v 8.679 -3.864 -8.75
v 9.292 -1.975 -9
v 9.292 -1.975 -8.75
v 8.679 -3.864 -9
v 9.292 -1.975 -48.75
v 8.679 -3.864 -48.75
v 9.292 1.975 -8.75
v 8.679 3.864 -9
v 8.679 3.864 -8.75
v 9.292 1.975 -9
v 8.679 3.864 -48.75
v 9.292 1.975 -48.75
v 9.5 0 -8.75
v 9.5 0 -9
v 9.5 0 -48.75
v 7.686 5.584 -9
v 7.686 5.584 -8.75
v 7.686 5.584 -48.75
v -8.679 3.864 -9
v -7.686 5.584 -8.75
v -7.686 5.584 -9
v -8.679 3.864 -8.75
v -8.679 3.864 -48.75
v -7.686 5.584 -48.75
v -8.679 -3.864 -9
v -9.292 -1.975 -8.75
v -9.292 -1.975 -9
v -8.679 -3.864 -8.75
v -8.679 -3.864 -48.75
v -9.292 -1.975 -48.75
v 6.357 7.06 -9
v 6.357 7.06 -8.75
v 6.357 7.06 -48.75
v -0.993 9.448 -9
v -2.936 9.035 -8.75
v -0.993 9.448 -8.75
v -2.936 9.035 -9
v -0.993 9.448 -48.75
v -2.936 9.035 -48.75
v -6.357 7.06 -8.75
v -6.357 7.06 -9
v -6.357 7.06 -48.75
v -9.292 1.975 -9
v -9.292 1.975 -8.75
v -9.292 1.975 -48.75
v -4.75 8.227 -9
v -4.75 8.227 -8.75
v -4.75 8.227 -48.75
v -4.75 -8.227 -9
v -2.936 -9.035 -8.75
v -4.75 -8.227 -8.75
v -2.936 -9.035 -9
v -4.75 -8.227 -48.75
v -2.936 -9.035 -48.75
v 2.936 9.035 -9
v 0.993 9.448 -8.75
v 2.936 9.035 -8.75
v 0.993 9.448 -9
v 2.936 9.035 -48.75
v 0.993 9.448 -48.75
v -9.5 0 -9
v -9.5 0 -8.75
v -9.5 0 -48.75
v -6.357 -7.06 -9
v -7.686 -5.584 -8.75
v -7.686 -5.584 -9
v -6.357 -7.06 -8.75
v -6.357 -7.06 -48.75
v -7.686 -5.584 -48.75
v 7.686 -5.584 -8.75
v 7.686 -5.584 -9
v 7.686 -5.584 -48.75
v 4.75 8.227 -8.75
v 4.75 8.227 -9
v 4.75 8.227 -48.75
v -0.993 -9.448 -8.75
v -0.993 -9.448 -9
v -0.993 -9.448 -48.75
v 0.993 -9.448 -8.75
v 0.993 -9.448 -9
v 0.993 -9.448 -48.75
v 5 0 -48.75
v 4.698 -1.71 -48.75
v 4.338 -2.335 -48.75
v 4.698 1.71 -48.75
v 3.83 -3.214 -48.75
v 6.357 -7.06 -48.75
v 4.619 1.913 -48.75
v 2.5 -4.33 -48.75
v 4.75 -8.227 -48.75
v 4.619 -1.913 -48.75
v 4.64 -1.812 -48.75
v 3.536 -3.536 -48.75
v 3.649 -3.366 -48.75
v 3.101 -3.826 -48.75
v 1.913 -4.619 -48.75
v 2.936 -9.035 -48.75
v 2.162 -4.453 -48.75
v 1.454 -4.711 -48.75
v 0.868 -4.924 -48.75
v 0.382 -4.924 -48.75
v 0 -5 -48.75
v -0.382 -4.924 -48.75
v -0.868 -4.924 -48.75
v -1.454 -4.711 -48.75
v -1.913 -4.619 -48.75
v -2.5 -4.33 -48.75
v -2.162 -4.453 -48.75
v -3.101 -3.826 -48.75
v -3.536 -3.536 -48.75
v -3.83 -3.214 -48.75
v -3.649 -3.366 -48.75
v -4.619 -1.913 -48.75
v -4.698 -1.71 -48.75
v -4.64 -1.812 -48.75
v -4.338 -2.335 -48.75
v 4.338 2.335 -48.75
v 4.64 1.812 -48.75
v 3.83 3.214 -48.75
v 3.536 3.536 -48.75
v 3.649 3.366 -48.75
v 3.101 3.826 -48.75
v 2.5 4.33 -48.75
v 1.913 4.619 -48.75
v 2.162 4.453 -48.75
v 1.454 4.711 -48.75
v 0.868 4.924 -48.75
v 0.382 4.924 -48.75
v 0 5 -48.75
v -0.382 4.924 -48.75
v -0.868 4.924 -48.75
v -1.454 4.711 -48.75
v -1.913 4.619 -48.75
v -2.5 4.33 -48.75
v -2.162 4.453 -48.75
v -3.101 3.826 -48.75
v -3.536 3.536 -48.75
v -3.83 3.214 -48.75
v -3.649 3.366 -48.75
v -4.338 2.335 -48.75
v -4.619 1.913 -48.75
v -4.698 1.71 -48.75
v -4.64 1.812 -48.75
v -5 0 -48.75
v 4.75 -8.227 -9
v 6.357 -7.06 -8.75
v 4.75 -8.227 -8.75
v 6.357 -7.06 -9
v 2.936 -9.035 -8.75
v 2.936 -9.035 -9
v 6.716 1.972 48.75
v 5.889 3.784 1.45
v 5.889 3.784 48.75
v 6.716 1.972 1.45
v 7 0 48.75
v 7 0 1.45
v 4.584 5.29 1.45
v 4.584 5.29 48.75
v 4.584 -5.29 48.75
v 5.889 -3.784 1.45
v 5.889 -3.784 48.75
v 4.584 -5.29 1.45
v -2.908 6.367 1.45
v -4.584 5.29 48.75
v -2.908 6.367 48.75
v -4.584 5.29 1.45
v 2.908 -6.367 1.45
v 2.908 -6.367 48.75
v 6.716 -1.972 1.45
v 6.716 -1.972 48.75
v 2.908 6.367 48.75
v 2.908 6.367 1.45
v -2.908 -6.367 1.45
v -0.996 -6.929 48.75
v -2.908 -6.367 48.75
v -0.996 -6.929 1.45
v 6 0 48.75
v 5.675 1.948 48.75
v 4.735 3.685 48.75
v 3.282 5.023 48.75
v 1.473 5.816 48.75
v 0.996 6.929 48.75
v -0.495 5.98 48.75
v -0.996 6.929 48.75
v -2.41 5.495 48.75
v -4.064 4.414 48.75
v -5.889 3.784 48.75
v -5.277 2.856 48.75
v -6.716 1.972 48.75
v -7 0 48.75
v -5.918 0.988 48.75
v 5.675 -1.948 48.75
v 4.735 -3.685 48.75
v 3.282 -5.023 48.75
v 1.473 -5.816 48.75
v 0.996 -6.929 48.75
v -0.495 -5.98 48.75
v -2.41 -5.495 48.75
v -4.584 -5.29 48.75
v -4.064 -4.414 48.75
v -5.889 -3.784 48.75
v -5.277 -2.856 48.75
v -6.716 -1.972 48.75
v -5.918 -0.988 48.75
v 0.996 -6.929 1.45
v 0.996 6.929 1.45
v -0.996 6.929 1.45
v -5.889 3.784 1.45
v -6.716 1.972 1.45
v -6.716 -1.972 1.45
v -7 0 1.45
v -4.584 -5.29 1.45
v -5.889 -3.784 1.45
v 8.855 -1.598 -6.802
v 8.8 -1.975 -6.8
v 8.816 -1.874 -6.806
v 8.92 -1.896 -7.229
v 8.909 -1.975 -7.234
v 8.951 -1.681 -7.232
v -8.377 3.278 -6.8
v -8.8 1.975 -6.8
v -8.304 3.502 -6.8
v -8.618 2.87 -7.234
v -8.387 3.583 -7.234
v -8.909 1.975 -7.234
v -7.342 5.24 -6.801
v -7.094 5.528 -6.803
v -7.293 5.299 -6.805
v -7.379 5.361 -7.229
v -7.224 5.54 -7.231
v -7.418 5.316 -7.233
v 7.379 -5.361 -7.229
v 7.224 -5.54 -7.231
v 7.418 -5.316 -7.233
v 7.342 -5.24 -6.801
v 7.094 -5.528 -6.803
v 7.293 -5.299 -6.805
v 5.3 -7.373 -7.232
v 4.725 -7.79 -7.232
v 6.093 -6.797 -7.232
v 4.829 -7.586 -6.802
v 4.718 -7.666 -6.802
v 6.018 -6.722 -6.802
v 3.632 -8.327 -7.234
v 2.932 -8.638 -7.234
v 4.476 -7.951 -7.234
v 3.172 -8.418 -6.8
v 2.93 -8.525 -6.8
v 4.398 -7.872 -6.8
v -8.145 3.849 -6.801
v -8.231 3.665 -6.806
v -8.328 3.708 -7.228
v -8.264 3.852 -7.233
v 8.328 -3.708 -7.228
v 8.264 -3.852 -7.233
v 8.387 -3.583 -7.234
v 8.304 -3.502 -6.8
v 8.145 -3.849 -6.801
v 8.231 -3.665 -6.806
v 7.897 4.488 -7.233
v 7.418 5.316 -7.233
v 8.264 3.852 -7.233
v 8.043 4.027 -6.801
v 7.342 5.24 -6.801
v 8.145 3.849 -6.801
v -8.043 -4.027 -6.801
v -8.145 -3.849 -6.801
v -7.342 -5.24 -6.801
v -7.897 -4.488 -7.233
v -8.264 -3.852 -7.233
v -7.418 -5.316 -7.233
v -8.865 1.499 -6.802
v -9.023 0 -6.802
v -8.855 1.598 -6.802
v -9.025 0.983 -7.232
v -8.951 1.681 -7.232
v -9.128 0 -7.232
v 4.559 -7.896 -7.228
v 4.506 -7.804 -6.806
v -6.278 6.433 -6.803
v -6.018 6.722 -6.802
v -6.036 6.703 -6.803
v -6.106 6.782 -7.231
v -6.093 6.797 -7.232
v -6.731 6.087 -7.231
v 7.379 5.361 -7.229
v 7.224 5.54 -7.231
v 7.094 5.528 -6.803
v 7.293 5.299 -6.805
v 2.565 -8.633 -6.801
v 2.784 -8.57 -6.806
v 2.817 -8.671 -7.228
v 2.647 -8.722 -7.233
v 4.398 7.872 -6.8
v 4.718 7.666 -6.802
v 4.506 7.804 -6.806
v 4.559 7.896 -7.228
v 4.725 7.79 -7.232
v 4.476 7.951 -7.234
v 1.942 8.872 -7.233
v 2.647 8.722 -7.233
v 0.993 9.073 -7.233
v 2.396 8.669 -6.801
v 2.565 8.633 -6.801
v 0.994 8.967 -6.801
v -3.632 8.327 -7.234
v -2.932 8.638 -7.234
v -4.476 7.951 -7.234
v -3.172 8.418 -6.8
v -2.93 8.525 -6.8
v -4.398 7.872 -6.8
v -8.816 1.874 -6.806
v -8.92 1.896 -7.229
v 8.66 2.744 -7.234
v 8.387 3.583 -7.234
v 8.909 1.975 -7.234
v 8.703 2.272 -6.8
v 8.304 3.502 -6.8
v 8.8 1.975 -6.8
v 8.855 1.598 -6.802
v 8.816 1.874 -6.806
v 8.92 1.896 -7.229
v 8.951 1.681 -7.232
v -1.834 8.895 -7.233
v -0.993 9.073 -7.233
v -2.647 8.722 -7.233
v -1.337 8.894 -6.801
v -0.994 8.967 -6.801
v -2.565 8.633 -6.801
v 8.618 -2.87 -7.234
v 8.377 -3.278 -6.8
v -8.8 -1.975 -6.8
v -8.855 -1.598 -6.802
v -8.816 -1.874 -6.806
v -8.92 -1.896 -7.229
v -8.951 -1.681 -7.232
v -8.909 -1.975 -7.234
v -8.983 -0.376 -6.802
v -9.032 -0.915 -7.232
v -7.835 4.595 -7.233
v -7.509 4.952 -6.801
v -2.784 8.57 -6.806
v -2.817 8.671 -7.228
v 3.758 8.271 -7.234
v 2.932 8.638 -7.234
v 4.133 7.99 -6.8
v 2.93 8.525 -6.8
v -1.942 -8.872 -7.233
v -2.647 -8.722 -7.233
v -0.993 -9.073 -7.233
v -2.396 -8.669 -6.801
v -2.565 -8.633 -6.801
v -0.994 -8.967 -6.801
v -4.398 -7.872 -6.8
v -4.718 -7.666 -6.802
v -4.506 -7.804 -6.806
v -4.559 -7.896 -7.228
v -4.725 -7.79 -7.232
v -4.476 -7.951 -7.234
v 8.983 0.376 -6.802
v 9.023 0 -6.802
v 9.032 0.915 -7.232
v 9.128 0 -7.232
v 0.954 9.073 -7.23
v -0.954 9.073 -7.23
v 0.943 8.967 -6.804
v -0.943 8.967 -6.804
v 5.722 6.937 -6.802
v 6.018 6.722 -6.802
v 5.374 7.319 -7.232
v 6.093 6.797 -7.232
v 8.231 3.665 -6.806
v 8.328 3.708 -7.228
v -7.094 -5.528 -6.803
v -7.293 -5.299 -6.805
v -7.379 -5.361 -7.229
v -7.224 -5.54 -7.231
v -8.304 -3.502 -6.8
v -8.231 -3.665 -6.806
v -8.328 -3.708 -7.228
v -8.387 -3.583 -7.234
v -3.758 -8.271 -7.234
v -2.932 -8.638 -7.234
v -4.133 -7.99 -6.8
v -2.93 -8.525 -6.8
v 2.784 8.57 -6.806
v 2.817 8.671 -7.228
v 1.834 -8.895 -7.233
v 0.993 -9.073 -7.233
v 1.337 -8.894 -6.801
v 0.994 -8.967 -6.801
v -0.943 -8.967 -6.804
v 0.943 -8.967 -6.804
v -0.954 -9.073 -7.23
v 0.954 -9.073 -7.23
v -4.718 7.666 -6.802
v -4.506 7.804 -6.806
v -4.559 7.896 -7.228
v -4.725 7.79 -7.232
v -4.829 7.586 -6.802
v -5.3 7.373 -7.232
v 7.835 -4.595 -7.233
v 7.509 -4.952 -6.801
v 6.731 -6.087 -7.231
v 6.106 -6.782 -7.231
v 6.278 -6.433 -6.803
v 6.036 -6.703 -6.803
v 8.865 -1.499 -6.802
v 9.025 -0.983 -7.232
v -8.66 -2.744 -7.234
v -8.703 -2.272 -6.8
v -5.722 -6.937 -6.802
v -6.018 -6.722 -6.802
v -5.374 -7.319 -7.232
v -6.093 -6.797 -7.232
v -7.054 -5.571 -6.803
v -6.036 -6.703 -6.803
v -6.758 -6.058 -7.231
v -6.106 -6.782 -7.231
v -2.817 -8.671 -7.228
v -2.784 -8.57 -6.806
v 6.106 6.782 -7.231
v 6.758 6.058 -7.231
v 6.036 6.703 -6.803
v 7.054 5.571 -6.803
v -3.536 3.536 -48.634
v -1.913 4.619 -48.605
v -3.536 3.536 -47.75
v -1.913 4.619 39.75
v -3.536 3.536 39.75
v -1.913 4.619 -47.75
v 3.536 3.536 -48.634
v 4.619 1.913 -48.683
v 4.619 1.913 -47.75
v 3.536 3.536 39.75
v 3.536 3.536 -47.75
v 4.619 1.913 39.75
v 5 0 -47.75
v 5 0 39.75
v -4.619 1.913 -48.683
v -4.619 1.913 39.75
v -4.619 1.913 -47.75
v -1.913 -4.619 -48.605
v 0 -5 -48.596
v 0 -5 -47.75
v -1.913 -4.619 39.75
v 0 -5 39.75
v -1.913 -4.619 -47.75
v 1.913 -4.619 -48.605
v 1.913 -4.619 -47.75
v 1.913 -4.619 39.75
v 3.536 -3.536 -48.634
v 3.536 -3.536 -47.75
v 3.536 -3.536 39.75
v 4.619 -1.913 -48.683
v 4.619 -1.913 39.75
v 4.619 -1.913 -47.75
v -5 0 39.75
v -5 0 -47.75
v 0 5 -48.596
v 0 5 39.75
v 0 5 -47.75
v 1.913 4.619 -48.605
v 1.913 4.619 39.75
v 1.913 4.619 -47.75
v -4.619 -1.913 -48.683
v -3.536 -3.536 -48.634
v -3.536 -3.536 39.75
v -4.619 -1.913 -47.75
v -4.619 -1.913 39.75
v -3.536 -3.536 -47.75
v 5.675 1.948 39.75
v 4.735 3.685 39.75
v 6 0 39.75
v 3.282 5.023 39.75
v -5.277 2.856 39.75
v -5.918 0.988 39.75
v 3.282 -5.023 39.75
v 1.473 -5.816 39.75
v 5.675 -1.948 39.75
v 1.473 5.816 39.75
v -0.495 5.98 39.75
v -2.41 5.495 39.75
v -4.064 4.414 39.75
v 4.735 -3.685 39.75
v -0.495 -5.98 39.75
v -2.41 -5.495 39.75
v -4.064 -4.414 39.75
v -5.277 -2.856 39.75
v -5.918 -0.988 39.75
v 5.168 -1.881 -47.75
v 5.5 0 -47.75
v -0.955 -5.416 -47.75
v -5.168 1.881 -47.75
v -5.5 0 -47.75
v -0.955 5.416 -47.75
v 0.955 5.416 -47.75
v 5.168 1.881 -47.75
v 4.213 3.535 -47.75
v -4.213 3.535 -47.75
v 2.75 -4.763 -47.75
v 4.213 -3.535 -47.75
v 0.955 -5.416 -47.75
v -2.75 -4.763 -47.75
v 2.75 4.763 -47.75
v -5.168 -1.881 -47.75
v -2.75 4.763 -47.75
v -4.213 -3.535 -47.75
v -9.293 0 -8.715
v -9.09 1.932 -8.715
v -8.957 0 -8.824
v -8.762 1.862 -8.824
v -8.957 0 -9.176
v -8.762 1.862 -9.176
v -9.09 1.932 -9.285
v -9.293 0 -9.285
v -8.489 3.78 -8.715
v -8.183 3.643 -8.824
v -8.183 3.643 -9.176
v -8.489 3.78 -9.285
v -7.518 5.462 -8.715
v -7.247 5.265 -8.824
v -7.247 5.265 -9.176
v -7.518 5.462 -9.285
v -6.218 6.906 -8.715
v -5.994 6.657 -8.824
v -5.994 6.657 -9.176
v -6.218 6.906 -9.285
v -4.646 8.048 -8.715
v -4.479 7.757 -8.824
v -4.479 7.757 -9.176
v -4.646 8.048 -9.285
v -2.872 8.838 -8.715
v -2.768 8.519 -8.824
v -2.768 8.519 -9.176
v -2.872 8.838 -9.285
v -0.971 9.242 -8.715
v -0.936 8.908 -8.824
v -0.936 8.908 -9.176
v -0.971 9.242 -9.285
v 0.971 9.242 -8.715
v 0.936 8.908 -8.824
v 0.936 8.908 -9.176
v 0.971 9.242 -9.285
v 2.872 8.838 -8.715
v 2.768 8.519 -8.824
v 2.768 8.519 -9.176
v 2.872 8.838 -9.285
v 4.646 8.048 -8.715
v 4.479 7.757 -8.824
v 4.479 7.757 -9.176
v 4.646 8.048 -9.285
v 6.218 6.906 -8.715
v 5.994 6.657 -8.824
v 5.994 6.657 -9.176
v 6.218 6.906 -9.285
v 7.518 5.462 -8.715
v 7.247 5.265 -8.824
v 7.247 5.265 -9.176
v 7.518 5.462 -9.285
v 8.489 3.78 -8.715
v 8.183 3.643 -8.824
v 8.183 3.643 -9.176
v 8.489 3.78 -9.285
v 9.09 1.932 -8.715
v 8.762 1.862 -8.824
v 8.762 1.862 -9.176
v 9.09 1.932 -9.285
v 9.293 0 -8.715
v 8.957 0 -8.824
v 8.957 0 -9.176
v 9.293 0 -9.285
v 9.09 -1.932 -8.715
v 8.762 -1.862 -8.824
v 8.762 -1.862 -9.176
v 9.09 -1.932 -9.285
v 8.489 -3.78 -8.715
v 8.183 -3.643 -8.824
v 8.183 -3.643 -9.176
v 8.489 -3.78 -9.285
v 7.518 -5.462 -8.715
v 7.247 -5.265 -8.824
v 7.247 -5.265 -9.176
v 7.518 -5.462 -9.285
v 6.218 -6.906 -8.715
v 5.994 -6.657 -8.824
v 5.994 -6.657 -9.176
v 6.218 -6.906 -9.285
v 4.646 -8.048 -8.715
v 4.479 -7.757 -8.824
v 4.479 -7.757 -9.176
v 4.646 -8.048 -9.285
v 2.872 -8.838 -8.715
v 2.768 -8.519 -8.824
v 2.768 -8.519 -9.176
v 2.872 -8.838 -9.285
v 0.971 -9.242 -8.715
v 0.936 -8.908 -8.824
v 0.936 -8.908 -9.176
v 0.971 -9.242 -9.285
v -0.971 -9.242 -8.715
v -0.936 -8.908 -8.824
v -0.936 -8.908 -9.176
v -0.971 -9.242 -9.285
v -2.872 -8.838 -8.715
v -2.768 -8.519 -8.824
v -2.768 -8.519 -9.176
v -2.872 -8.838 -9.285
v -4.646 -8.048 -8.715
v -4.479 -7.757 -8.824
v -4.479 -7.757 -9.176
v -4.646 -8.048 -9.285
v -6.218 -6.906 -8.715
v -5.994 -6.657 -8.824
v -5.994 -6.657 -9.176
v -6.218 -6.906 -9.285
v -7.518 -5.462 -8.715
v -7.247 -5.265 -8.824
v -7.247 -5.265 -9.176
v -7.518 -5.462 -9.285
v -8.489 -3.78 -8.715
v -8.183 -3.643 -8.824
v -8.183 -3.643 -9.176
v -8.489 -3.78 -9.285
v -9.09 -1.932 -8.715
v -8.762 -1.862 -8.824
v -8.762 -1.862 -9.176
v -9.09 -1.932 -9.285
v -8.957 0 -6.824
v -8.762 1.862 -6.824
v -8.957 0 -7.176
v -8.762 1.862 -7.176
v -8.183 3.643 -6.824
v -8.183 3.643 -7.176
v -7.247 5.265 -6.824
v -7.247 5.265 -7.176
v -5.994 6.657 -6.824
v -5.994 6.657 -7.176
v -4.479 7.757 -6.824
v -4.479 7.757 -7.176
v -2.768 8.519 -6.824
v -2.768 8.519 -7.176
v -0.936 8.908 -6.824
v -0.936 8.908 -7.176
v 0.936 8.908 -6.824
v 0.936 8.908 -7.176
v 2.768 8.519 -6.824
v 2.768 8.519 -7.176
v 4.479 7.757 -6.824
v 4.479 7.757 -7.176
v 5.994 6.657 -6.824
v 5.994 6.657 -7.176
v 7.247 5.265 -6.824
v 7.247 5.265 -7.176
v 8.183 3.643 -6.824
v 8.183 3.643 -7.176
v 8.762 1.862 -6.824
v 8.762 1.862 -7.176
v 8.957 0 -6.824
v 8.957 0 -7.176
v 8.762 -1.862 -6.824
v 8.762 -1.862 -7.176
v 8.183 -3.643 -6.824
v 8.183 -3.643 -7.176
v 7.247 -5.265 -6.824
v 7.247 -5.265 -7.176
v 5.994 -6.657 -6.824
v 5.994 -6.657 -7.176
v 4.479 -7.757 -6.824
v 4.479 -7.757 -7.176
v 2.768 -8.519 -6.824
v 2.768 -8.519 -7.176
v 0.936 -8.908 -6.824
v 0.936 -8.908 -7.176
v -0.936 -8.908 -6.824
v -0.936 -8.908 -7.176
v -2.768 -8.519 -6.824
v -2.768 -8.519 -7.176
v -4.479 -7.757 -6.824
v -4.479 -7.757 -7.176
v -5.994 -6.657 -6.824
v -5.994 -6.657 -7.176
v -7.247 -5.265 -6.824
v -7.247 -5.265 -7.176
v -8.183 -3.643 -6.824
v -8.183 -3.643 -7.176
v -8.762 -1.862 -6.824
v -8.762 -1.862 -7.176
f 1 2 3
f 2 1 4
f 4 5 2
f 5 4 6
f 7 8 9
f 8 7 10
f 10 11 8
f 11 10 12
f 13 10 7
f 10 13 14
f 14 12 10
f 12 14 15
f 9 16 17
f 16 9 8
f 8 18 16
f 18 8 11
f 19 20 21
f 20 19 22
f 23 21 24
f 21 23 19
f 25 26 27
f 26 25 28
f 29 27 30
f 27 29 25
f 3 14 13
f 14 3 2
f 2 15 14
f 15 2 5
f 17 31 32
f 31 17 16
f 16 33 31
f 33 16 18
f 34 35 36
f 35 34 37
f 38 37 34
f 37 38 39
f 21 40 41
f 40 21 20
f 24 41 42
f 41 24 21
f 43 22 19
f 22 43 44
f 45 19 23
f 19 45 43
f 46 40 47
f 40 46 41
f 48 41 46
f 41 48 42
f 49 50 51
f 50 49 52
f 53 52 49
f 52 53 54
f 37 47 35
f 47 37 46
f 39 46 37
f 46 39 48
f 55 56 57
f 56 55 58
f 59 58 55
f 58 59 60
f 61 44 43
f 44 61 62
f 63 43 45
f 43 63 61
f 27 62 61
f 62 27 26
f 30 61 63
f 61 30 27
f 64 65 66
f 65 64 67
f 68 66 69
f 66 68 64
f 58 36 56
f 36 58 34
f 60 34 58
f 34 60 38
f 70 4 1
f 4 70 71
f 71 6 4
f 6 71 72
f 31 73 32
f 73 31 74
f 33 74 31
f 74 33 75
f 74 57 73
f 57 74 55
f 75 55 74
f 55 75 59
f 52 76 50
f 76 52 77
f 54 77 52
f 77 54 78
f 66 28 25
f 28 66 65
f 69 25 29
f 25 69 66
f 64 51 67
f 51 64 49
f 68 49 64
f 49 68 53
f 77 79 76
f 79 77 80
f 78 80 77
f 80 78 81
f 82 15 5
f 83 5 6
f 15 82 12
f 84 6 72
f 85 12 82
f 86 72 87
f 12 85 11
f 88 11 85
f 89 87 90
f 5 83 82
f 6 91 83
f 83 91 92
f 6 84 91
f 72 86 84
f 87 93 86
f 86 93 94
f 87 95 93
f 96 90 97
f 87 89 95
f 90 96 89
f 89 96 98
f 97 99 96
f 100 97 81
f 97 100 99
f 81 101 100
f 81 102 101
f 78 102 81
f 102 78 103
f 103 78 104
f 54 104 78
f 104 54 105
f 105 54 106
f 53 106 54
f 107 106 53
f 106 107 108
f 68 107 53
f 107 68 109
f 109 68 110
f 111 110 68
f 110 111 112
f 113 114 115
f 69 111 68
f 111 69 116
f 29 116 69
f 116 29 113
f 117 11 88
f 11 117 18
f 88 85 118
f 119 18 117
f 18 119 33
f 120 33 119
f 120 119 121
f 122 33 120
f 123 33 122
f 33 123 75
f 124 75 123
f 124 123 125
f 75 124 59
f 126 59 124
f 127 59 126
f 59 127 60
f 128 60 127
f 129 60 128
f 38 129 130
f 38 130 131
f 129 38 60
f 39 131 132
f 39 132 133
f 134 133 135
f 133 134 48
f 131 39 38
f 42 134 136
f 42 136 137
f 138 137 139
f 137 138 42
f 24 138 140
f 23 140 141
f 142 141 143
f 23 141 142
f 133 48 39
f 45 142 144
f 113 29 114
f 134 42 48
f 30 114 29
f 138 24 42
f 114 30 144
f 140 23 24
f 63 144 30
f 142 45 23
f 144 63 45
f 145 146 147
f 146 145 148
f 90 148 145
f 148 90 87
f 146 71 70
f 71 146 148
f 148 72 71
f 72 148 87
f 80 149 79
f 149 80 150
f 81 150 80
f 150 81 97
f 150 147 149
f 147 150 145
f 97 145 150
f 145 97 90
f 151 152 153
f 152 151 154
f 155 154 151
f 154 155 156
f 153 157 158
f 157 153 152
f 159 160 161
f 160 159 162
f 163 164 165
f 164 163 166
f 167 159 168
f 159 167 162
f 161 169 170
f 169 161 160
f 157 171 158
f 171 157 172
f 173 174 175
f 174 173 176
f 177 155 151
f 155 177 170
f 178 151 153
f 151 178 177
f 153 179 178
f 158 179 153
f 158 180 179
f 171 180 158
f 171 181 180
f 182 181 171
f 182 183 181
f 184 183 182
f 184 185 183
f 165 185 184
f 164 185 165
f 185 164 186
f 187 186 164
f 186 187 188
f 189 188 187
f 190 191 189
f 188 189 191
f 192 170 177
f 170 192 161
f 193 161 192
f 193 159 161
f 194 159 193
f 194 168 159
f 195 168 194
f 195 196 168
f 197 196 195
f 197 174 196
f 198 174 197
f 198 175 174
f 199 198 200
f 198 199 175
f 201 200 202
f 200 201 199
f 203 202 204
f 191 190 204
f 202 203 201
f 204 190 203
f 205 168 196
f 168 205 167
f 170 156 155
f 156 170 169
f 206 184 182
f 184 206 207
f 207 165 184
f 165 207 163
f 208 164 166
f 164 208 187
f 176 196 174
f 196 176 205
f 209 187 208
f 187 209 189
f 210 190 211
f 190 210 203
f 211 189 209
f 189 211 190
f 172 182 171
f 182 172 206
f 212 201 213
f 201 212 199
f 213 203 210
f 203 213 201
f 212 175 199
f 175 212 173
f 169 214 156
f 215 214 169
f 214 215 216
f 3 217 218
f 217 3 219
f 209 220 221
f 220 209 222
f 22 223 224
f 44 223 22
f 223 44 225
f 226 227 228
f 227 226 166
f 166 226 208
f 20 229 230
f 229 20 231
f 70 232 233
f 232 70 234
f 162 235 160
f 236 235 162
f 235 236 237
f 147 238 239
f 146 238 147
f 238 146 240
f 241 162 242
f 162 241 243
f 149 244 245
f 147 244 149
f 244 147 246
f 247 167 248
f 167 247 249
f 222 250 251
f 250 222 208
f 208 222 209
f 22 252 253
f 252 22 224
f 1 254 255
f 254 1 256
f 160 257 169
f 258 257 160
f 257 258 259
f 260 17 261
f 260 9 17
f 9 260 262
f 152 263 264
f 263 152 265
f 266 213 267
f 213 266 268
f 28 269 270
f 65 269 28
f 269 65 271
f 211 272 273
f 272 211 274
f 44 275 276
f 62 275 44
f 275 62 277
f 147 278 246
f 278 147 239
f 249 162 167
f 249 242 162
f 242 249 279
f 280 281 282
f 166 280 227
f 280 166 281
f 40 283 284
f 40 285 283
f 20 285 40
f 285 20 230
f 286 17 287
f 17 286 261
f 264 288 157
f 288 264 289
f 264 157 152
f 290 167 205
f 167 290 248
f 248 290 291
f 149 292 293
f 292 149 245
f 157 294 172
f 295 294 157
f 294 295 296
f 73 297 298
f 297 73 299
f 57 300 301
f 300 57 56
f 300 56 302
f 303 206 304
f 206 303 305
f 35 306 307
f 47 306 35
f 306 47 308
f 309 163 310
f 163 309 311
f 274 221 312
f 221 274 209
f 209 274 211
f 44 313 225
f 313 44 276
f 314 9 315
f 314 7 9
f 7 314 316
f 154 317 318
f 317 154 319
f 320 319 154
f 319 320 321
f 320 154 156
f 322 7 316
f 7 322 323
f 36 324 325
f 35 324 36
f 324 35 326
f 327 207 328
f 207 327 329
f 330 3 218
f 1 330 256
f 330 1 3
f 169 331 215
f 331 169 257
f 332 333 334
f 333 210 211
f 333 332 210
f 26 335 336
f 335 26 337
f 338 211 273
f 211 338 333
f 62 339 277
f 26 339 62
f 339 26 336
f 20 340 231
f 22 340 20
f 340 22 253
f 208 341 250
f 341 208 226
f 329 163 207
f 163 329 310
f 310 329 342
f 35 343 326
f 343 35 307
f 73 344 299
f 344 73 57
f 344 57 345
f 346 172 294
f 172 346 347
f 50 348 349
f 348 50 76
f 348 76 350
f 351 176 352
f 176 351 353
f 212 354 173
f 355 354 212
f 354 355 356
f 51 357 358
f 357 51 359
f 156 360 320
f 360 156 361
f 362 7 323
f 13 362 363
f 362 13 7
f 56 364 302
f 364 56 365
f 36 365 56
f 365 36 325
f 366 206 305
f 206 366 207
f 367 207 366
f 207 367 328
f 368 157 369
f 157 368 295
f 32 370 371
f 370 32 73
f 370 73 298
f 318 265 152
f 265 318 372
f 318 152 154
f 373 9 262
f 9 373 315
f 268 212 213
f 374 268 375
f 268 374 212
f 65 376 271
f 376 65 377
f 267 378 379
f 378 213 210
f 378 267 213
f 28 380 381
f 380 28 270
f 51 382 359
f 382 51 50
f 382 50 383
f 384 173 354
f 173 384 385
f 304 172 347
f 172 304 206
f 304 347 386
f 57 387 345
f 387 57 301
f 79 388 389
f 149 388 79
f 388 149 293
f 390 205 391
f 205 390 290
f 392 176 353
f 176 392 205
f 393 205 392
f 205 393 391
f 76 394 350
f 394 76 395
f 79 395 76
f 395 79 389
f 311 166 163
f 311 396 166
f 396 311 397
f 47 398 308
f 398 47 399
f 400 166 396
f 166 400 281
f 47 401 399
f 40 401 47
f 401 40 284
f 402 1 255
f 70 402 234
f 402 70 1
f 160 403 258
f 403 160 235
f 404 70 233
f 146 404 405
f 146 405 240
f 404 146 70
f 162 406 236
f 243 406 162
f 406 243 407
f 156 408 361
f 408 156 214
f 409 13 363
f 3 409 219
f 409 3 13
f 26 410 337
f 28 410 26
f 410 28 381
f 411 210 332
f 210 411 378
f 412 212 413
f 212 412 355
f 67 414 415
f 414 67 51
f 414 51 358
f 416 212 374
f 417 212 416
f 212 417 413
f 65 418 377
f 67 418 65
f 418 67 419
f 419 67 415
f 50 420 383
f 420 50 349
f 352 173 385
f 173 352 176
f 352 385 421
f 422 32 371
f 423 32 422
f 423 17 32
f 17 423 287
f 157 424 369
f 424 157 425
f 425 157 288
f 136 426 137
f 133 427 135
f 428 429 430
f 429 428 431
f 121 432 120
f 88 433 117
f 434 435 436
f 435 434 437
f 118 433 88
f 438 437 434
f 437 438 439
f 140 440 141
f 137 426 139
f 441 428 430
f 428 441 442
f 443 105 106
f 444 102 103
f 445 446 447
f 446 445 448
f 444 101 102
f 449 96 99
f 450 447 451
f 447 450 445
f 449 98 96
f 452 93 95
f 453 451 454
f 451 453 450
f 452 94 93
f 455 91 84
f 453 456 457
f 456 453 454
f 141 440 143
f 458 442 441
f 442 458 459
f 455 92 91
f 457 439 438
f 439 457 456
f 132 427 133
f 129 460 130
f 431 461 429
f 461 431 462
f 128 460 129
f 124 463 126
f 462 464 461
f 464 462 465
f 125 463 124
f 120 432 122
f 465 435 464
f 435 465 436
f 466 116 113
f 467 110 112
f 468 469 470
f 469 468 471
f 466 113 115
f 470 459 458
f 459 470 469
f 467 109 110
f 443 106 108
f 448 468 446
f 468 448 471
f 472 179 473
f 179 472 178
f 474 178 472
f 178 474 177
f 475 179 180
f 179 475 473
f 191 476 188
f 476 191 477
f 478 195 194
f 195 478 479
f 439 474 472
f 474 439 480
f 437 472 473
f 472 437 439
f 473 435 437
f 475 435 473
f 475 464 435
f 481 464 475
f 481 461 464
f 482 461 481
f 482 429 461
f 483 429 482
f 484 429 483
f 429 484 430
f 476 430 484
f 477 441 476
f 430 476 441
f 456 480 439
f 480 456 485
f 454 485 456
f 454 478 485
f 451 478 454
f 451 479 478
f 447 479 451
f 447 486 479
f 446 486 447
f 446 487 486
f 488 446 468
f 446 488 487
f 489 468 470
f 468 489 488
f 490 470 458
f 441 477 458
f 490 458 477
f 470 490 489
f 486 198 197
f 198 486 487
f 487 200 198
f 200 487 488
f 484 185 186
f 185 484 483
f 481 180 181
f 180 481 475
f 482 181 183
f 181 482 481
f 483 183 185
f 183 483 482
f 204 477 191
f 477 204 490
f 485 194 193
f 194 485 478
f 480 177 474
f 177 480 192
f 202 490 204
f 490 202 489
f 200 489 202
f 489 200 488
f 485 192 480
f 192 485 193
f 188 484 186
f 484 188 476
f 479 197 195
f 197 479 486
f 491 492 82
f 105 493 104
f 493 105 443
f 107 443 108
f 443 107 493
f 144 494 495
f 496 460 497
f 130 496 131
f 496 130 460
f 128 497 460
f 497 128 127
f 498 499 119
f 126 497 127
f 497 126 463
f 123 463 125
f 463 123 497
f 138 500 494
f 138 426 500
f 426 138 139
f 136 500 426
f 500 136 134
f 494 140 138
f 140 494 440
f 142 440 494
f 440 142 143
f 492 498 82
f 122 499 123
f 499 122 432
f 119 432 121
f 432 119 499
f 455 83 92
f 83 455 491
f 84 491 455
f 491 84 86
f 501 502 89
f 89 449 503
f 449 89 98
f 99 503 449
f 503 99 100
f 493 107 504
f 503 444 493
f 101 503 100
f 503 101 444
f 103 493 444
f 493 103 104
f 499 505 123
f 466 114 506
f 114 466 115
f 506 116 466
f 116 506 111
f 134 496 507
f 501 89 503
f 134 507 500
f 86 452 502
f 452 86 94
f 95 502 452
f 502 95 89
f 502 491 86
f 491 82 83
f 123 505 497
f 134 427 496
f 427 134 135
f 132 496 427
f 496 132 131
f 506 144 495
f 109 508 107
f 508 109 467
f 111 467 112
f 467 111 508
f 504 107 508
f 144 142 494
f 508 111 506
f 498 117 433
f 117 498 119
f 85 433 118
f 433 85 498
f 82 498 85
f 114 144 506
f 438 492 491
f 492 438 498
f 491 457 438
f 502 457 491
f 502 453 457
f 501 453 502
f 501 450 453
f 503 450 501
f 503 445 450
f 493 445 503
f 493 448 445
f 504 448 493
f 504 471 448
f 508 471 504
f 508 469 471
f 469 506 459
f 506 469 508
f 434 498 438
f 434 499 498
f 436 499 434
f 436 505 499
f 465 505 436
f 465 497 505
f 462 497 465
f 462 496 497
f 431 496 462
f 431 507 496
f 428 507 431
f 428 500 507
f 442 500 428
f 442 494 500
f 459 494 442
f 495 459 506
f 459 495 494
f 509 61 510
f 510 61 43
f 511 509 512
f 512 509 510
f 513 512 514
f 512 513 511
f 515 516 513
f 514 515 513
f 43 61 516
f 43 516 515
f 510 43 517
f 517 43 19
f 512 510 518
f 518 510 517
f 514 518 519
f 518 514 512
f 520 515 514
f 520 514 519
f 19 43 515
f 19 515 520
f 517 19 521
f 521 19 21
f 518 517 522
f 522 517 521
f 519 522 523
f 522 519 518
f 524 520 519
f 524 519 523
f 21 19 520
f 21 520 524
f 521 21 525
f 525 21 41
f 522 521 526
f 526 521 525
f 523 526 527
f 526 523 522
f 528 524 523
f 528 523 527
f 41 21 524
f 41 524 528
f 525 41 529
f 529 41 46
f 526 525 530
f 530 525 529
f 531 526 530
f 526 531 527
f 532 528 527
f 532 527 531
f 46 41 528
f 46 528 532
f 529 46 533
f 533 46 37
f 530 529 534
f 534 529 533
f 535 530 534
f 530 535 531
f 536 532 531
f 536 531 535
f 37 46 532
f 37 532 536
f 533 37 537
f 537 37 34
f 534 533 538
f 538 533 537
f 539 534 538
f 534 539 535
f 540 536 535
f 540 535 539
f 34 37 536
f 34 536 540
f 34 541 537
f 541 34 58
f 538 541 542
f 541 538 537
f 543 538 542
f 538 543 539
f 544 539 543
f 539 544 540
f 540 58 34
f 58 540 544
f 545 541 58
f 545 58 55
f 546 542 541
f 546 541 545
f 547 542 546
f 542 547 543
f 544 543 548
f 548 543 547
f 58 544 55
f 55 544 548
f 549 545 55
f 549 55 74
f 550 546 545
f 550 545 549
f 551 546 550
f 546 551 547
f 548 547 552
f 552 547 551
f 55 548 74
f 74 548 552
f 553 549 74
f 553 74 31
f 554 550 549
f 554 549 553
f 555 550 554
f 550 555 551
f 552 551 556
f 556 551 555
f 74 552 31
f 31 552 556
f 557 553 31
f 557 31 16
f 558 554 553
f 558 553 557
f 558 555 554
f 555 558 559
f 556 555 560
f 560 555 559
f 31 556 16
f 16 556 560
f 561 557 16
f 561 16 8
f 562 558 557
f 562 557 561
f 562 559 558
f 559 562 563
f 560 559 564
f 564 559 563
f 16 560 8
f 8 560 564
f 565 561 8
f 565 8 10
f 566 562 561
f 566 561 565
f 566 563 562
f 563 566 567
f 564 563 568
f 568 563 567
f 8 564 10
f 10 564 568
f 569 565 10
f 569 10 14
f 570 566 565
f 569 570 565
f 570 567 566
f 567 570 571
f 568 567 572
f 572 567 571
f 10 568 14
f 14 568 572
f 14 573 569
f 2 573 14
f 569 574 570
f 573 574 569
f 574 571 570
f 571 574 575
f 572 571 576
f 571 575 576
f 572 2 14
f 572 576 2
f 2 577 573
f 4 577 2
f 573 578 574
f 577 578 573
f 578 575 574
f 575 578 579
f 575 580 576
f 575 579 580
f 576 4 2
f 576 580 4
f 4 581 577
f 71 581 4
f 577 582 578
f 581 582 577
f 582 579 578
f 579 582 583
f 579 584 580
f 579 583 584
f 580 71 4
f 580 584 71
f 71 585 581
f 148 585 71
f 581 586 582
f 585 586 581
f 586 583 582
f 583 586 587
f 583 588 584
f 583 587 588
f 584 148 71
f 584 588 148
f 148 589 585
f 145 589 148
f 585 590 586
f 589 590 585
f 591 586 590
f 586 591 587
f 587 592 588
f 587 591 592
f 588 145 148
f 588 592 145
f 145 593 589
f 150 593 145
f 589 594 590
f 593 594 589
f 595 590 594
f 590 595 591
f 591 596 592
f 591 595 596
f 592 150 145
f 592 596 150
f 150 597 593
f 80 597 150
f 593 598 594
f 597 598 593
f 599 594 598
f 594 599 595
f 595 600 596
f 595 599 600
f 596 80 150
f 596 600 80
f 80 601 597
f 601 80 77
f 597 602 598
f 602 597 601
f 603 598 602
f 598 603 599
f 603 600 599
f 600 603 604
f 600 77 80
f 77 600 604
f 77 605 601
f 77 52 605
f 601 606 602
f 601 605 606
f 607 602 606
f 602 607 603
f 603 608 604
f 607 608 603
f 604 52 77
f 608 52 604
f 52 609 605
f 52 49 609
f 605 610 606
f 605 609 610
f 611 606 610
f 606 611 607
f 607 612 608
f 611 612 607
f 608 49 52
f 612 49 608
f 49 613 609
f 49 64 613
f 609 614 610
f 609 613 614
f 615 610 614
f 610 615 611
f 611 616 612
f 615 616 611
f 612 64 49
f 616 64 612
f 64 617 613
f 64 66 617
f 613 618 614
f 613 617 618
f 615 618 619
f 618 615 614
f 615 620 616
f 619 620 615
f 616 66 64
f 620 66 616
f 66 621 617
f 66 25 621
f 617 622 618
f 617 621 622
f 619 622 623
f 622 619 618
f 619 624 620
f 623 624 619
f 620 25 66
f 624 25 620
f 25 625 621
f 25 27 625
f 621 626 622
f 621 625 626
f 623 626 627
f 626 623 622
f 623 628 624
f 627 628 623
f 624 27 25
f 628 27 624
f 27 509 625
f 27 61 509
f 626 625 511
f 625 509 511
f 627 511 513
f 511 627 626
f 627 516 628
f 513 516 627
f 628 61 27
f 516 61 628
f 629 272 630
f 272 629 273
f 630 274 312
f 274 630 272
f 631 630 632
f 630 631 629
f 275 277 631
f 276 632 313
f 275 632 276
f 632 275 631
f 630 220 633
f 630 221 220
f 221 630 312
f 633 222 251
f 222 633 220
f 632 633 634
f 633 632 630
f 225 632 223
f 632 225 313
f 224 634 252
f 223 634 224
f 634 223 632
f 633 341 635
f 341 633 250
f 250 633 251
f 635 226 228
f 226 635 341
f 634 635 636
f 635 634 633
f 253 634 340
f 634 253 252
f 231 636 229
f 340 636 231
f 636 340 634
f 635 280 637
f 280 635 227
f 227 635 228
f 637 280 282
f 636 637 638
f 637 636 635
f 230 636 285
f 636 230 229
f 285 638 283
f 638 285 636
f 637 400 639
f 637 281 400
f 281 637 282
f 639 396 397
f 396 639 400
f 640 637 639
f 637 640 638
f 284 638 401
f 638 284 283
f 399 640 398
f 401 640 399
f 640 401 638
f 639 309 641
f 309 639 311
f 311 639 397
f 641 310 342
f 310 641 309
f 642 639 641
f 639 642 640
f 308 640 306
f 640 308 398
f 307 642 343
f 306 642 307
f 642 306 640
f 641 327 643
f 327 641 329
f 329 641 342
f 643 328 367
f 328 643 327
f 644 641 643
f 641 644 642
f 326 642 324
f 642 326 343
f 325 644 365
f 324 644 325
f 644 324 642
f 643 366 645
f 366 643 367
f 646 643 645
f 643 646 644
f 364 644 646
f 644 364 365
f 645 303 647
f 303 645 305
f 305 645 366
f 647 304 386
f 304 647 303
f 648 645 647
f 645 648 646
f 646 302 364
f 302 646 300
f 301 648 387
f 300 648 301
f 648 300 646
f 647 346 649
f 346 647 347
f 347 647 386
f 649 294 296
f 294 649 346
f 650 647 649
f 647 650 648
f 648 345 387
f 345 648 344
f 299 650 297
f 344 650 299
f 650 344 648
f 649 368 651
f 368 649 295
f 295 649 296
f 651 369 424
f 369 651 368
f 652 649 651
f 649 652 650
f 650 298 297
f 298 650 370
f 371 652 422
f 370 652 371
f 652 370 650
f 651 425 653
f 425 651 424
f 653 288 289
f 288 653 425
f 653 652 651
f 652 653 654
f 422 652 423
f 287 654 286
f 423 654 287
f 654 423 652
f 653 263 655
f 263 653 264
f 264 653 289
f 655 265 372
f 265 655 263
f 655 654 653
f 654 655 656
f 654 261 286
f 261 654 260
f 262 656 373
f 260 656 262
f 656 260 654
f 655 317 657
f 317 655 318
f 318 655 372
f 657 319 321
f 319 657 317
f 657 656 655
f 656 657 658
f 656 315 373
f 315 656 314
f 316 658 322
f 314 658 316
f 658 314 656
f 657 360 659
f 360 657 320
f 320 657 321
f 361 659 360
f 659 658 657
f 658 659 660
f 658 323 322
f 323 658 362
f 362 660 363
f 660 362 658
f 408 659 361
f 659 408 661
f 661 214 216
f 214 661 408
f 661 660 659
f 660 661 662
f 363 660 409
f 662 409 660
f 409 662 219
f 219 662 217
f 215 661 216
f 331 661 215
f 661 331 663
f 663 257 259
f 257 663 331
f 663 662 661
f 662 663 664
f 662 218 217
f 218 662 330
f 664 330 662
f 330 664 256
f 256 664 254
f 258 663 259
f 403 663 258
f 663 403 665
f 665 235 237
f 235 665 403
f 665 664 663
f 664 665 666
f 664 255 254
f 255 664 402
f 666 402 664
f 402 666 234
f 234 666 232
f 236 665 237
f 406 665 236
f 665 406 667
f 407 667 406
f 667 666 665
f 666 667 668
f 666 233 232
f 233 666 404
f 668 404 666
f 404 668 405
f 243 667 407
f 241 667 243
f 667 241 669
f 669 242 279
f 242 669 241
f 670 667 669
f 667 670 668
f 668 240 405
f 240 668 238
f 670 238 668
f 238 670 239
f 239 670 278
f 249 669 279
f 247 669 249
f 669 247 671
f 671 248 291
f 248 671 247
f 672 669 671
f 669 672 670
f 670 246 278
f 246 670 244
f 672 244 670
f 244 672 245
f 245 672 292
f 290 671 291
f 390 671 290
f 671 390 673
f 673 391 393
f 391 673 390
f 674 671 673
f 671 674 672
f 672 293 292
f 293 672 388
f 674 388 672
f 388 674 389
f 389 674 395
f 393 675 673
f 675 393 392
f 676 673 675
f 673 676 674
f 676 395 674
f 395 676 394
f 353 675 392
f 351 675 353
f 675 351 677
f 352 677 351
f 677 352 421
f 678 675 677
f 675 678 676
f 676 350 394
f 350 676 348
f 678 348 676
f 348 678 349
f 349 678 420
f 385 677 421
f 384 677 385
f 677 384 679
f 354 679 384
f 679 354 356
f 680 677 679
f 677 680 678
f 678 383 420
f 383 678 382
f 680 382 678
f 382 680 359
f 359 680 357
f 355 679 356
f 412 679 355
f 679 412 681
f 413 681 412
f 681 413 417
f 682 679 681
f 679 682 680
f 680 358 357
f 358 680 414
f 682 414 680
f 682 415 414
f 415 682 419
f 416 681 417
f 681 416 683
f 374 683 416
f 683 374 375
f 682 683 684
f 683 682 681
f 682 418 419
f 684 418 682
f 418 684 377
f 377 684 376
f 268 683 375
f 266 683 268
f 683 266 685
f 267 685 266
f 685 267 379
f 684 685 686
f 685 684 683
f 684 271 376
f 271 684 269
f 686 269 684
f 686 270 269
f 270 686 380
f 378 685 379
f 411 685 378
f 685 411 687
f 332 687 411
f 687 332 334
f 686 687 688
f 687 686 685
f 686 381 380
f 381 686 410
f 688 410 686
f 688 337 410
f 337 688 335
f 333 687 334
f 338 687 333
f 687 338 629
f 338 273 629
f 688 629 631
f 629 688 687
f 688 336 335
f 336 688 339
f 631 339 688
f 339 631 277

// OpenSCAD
// Parameters
L_total = 97.5; //[48.75:195:0.5]
OD_max = 19; //[9.5:38:0.1]
OD_min = 14; //[7:28:0.1]
L_large = 40; //[20:80:0.5]
L_taper = 10; //[5:20:0.5]
L_small = 47.5; //[23.75:95:0.5]
ID_bore = 10; //[5:18:0.1]
chamfer = 0.5; //[0.2:2:0.1]
overlap = 1; //[0.5:2:0.1]
fillet_r = 0.6; //[0.2:2:0.1]
counterbore_ID = 12; //[10.2:18:0.1]
counterbore_depth = 8; //[2:20:0.5]
knurl_depth = 0.3; //[0.1:1:0.05]
knurl_pitch = 2; //[1:5:0.5]
knurl_count = 10; //[3:30:1]

// Base Shapes
module outer_cylinder_section_large_OD() {
  translate([0, 0, -L_total/2 + L_large/2])
    cylinder(h=L_large, r=OD_max/2, center=true);
}

module outer_cylinder_section_small_OD() {
  translate([0, 0, L_total/2 - L_small/2])
    cylinder(h=L_small, r=OD_min/2, center=true);
}

module outer_conical_frustum_transition() {
  translate([0, 0, -L_total/2 + L_large + L_taper/2 - overlap/2])
    cylinder(h=L_taper, r1=OD_max/2, r2=OD_min/2, center=true);
}

module central_through_bore() {
  cylinder(h=L_total + 2*overlap, r=ID_bore/2, center=true);
}

module end_face_chamfer_minusZ() {
  translate([0, 0, -L_total/2 + chamfer])
    rotate([180, 0, 0])
    cylinder(h=2*chamfer, r1=ID_bore/2 + chamfer, r2=ID_bore/2, center=true);
}

module end_face_chamfer_plusZ() {
  translate([0, 0, L_total/2 - chamfer])
    cylinder(h=2*chamfer, r1=ID_bore/2 + chamfer, r2=ID_bore/2, center=true);
}

module internal_counterbore() {
  translate([0, 0, L_total/2 - (counterbore_depth + overlap)/2])
    cylinder(h=counterbore_depth + overlap, r=counterbore_ID/2, center=true);
}

module fillet_blend_large_side() {
  translate([0, 0, -L_total/2 + L_large - fillet_r])
    cylinder(h=2*fillet_r, r=OD_max/2, center=true);
}

module fillet_blend_small_side() {
  translate([0, 0, -L_total/2 + L_large + L_taper + fillet_r - overlap])
    cylinder(h=2*fillet_r, r=OD_min/2, center=true);
}

module knurl_groove_cutter_proto() {
  rotate_extrude()
    translate([OD_max/2 - knurl_depth, 0, 0])
    circle(r=knurl_depth);
}

// Operations
module outer_union_raw() {
  union() {
    outer_cylinder_section_large_OD();
    outer_conical_frustum_transition();
    outer_cylinder_section_small_OD();
  }
}

module fillet_on_OD_transitions() {
  hull() {
    fillet_blend_large_side();
    fillet_blend_small_side();
  }
}

module outer_union_with_fillet() {
  union() {
    outer_union_raw();
    fillet_on_OD_transitions();
  }
}

module outer_minus_bore() {
  difference() {
    outer_union_with_fillet();
    central_through_bore();
  }
}

module outer_minus_bore_and_counterbore() {
  difference() {
    outer_minus_bore();
    internal_counterbore();
  }
}

module outer_minus_internal_edge_breaks() {
  difference() {
    outer_minus_bore_and_counterbore();
    end_face_chamfer_minusZ();
    end_face_chamfer_plusZ();
  }
}

module knurl_grooves() {
  for (i = [0:knurl_count-1]) {
    translate([0, 0, -(knurl_count-1)*knurl_pitch/2 + i*knurl_pitch])
      knurl_groove_cutter_proto();
  }
}

module surface_text_or_knurl() {
  difference() {
    outer_minus_internal_edge_breaks();
    knurl_grooves();
  }
}

// Final Output
surface_text_or_knurl();
